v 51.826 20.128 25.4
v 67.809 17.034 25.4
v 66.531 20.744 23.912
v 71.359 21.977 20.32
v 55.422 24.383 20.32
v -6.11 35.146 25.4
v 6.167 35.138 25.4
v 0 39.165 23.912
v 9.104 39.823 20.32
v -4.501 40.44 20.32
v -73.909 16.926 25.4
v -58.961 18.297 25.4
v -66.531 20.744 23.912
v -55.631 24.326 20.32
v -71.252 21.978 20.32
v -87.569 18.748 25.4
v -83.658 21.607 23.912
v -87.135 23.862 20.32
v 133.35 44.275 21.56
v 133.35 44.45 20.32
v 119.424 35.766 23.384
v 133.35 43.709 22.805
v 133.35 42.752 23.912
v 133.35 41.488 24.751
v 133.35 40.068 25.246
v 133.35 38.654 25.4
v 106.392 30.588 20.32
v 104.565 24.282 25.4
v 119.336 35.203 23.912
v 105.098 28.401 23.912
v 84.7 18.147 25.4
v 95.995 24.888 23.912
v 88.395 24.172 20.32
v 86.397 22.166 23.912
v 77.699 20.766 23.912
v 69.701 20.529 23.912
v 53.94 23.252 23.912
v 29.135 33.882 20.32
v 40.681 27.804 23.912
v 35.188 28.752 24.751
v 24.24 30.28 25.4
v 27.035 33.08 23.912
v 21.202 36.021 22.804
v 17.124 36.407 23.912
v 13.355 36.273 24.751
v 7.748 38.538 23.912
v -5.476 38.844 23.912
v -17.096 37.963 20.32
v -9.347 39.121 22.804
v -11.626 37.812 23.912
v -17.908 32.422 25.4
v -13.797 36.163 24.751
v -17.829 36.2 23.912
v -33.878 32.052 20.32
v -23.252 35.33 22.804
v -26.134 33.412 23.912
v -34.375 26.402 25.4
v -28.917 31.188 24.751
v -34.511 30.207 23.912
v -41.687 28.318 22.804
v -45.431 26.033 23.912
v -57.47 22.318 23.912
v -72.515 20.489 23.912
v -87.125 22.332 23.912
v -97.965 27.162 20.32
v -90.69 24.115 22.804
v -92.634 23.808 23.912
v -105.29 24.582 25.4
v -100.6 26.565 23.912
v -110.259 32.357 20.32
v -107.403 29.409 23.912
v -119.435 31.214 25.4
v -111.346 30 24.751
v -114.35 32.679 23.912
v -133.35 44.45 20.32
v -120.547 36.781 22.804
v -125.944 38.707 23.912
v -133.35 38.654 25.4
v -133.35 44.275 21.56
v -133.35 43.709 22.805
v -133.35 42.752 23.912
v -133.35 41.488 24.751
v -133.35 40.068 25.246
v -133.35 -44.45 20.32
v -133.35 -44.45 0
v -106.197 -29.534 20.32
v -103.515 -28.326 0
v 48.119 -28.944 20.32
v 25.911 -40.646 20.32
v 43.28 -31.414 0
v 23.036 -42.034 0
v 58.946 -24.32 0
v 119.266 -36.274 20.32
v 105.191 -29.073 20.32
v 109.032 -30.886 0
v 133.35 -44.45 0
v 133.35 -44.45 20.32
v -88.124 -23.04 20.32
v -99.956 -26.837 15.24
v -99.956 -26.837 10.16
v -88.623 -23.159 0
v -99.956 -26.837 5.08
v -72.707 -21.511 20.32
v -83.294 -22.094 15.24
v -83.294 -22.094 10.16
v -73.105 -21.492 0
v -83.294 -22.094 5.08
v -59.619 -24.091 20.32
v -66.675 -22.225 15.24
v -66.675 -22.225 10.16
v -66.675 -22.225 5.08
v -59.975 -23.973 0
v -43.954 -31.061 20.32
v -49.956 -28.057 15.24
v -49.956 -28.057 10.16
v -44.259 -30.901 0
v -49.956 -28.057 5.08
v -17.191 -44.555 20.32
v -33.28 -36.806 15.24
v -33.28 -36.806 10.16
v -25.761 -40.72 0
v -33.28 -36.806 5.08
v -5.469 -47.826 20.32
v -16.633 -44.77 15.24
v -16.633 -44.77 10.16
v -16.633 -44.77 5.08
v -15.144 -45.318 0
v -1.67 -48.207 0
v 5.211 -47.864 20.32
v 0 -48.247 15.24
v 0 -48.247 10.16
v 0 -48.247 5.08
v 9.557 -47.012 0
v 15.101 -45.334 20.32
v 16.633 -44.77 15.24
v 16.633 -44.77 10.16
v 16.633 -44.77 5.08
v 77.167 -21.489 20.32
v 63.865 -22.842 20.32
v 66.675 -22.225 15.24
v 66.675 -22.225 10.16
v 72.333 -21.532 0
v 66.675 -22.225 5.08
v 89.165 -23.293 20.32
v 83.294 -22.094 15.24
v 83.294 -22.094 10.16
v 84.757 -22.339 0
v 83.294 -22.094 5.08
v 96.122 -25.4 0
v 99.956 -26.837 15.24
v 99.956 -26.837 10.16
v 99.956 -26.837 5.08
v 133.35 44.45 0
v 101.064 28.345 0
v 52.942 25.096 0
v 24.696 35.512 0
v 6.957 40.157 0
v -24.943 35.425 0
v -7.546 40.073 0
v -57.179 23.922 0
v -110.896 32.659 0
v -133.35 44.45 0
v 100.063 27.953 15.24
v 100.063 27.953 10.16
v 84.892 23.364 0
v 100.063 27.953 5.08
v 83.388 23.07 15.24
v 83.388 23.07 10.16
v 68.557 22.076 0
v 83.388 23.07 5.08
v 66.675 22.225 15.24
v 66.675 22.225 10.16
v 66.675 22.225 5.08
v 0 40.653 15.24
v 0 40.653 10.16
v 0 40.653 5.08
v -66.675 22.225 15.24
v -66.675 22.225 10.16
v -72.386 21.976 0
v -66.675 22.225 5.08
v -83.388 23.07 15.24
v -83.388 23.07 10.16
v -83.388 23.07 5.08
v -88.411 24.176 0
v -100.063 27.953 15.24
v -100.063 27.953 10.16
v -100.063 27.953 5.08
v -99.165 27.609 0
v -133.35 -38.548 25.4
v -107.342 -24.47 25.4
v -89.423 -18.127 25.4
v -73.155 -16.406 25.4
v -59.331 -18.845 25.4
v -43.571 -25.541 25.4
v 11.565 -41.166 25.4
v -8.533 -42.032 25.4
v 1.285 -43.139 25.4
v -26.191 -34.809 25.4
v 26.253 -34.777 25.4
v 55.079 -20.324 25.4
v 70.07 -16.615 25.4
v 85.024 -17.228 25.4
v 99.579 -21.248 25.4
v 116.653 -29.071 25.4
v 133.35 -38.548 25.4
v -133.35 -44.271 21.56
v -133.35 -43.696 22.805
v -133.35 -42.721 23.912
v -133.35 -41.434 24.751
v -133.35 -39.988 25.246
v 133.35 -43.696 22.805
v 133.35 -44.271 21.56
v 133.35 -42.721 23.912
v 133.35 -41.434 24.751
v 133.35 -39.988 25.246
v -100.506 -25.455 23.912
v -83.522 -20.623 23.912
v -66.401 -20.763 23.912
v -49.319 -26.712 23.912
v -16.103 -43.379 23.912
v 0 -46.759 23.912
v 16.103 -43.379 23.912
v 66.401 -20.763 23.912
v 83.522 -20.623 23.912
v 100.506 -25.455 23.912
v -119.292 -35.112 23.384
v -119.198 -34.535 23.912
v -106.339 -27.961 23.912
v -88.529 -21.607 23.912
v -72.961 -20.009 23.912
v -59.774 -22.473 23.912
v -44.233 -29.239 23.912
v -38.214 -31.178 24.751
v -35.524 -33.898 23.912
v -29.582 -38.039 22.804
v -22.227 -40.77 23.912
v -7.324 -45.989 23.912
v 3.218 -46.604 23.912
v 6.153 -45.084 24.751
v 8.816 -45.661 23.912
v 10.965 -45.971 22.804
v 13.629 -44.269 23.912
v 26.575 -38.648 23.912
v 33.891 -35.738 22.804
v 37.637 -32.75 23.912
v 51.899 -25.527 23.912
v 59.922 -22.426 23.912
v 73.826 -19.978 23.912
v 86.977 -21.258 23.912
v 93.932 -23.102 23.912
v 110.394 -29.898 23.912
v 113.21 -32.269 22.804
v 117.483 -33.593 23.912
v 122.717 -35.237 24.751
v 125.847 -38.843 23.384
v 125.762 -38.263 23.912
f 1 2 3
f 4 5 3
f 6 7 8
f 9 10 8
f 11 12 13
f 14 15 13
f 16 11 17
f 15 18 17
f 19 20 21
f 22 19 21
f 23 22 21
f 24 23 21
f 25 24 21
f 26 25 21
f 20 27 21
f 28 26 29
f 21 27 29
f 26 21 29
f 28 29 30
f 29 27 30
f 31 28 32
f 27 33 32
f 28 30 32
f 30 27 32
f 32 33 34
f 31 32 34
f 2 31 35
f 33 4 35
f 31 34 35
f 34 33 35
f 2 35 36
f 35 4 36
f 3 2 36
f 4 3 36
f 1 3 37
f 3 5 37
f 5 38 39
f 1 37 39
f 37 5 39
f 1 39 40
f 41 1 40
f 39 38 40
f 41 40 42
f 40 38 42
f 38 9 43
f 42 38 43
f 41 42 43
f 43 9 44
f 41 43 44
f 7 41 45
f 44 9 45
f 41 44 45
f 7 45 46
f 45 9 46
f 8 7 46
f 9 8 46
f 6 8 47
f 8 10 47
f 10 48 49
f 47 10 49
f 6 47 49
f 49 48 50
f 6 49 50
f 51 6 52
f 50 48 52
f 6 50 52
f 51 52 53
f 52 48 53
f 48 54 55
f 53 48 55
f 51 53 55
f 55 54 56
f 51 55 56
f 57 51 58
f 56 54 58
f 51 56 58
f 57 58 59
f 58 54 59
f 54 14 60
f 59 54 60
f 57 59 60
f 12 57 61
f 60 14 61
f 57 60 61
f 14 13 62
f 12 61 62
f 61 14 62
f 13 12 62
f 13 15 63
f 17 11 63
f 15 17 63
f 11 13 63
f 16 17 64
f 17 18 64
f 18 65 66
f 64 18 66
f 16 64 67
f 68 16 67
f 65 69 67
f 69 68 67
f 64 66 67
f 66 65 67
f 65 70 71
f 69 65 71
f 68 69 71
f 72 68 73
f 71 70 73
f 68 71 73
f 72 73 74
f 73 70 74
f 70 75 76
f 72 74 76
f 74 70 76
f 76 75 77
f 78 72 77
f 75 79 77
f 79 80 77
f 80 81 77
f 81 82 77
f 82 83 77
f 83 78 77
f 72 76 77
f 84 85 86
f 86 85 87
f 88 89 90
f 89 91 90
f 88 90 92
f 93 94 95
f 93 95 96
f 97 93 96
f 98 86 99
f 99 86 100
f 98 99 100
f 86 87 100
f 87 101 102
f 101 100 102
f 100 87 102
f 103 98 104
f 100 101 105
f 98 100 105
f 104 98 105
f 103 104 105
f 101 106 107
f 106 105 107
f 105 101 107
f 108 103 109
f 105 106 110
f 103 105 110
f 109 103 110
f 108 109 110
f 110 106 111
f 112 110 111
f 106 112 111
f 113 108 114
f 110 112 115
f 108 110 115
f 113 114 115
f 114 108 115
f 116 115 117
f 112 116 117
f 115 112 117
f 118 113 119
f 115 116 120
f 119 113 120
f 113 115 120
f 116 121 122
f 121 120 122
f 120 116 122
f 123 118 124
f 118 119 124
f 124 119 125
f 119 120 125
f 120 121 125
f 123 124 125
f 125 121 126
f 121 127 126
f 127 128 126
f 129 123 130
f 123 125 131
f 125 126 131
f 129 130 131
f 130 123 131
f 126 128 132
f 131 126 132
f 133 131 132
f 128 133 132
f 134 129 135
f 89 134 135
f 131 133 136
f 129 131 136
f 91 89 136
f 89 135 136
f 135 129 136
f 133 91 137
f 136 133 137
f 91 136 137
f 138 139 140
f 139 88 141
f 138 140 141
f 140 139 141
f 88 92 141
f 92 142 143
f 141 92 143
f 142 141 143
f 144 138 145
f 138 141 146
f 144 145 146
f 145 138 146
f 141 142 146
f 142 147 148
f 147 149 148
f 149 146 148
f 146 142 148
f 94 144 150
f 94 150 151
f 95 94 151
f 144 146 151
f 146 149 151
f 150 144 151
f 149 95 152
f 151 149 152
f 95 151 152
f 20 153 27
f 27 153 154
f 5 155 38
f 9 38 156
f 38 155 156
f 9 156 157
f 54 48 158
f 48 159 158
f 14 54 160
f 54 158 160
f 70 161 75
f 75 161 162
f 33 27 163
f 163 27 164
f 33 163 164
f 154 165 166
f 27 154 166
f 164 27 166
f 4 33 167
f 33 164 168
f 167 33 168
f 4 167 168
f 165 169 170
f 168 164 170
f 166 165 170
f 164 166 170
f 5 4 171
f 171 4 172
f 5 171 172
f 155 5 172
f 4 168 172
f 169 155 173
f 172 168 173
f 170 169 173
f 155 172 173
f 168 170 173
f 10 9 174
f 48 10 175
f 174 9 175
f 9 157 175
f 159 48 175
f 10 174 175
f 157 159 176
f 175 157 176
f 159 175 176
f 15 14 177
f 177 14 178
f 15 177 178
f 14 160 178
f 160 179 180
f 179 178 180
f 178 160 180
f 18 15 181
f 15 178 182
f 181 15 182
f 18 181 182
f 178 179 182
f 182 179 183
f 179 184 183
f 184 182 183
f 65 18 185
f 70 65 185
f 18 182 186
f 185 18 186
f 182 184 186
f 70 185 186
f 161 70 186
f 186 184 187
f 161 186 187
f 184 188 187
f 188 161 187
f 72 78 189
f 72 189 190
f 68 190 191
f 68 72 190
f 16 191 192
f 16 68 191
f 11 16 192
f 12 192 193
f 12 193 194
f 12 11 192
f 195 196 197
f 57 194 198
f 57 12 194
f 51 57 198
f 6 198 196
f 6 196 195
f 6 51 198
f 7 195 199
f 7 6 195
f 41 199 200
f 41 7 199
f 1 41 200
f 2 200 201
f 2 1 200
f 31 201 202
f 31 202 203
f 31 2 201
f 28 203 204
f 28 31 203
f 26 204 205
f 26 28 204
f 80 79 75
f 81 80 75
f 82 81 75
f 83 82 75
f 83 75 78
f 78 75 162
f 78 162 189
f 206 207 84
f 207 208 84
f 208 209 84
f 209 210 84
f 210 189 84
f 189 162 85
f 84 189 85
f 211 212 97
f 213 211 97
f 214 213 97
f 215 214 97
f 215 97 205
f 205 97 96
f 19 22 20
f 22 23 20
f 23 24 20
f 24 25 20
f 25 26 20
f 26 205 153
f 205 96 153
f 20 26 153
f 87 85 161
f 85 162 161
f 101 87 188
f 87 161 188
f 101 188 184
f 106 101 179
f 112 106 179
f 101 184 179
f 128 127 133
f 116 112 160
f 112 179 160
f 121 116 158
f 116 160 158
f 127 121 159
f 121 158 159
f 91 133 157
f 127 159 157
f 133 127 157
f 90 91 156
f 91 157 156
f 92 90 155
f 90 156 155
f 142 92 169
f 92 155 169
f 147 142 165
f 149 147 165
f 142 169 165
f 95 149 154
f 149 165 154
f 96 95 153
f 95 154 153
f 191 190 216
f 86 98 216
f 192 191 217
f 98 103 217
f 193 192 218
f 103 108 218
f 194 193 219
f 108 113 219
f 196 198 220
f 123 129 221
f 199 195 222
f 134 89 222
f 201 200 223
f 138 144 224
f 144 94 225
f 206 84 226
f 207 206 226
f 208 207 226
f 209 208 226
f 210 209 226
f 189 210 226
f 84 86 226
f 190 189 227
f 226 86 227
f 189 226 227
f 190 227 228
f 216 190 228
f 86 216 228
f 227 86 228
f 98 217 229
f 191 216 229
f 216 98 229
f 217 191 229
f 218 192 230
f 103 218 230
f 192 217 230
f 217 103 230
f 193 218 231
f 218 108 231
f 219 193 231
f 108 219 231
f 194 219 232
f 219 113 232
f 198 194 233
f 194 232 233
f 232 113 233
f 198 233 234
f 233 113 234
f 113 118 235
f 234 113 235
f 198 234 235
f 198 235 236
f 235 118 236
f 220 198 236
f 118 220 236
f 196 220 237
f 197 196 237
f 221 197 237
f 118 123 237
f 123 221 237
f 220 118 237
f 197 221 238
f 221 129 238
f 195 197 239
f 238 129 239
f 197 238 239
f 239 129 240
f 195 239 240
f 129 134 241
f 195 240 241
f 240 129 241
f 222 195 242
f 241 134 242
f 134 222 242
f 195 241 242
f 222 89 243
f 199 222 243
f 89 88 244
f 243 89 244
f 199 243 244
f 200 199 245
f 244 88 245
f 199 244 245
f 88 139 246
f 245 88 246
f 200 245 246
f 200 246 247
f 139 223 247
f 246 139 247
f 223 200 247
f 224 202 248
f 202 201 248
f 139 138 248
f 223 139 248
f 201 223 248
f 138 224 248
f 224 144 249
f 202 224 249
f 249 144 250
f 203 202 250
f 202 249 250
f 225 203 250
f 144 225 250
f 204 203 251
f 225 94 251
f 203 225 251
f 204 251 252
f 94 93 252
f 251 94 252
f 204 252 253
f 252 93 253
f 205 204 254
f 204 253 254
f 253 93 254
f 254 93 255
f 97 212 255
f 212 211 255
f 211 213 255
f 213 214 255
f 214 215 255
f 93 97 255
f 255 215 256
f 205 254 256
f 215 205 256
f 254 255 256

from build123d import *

# Parameters (mm, degrees)
F1_DEPTH = 25.4
F2_R     = 5.08


with BuildPart() as f1:
    # F0 (on Top) → F1 (new body)
    with BuildSketch(Plane.XY):
        with BuildLine():
            Line((-66.675, 0), (0, 0))
            Line((0, 0), (0, 40.6527627649))
            add(Edge.make_bspline(
                [(-66.675, 22.225), (-44.5375090127, 24.3723570613), (-22.2687545064, 40.6527627649), (0, 40.6527627649)],
                knots=[0.2509921979, 0.2509921979, 0.2509921979, 0.2509921979, 0.5, 0.5, 0.5, 0.5], degree=3))
            Line((-66.675, 22.225), (-66.675, 0))
        make_face()
        with BuildLine():
            Line((66.675, 0), (0, 0))
            Line((0, 0), (0, -48.2472372351))
            add(Edge.make_bspline(
                [(0, -48.2472372351), (22.1739498153, -48.2472372351), (44.3478996306, -26.4101755095), (66.675, -22.225)],
                knots=[0.5, 0.5, 0.5, 0.5, 0.7511380765, 0.7511380765, 0.7511380765, 0.7511380765], degree=3))
            Line((66.675, -22.225), (66.675, 0))
        make_face()
        with BuildLine():
            Line((0, -48.2472372351), (0, 0))
            Line((0, 0), (-66.675, 0))
            Line((-66.675, 0), (-66.675, -22.225))
            add(Edge.make_bspline(
                [(-66.675, -22.225), (-44.3478996306, -26.4101755095), (-22.1739498153, -48.2472372351), (0, -48.2472372351)],
                knots=[0.2488619235, 0.2488619235, 0.2488619235, 0.2488619235, 0.5, 0.5, 0.5, 0.5], degree=3))
        make_face()
        with BuildLine():
            Line((0, 40.6527627649), (0, 0))
            Line((0, 0), (66.675, 0))
            Line((66.675, 0), (66.675, 22.225))
            add(Edge.make_bspline(
                [(0, 40.6527627649), (22.2687545064, 40.6527627649), (44.5375090127, 24.3723570613), (66.675, 22.225)],
                knots=[0.5, 0.5, 0.5, 0.5, 0.7490078021, 0.7490078021, 0.7490078021, 0.7490078021], degree=3))
        make_face()
        with BuildLine():
            Line((-66.675, -22.225), (-66.675, 0))
            Line((-66.675, 0), (-133.35, 0))
            Line((-133.35, 0), (-133.35, -44.45))
            add(Edge.make_bspline(
                [(-133.35, -44.45), (-111.0748709935, -31.2638781059), (-88.7997419869, -18.0777562117), (-66.675, -22.225)],
                knots=[0, 0, 0, 0, 0.2488619235, 0.2488619235, 0.2488619235, 0.2488619235], degree=3))
        make_face()
        with BuildLine():
            Line((-133.35, 0), (-66.675, 0))
            Line((-66.675, 0), (-66.675, 22.225))
            add(Edge.make_bspline(
                [(-133.35, 44.45), (-111.1694546629, 32.2552650985), (-88.9889093259, 20.060530197), (-66.675, 22.225)],
                knots=[0, 0, 0, 0, 0.2509921979, 0.2509921979, 0.2509921979, 0.2509921979], degree=3))
            Line((-133.35, 44.45), (-133.35, 0))
        make_face()
        with BuildLine():
            Line((66.675, 22.225), (66.675, 0))
            Line((66.675, 0), (133.35, 0))
            Line((133.35, 0), (133.35, 44.45))
            add(Edge.make_bspline(
                [(66.675, 22.225), (88.9889093259, 20.060530197), (111.1694546629, 32.2552650985), (133.35, 44.45)],
                knots=[0.7490078021, 0.7490078021, 0.7490078021, 0.7490078021, 1, 1, 1, 1], degree=3))
        make_face()
        with BuildLine():
            Line((133.35, 0), (66.675, 0))
            Line((66.675, 0), (66.675, -22.225))
            add(Edge.make_bspline(
                [(66.675, -22.225), (88.7997419869, -18.0777562117), (111.0748709935, -31.2638781059), (133.35, -44.45)],
                knots=[0.7511380765, 0.7511380765, 0.7511380765, 0.7511380765, 1, 1, 1, 1], degree=3))
            Line((133.35, -44.45), (133.35, 0))
        make_face()
    extrude(amount=F1_DEPTH)

    # F2
    f2_edges = [f1.edges().sort_by_distance(p)[0] for p in [
        (0, -48.247237, 25.4),
        (0, 40.652763, 25.4),
    ]]
    fillet(f2_edges, radius=F2_R)


solid = f1.part
